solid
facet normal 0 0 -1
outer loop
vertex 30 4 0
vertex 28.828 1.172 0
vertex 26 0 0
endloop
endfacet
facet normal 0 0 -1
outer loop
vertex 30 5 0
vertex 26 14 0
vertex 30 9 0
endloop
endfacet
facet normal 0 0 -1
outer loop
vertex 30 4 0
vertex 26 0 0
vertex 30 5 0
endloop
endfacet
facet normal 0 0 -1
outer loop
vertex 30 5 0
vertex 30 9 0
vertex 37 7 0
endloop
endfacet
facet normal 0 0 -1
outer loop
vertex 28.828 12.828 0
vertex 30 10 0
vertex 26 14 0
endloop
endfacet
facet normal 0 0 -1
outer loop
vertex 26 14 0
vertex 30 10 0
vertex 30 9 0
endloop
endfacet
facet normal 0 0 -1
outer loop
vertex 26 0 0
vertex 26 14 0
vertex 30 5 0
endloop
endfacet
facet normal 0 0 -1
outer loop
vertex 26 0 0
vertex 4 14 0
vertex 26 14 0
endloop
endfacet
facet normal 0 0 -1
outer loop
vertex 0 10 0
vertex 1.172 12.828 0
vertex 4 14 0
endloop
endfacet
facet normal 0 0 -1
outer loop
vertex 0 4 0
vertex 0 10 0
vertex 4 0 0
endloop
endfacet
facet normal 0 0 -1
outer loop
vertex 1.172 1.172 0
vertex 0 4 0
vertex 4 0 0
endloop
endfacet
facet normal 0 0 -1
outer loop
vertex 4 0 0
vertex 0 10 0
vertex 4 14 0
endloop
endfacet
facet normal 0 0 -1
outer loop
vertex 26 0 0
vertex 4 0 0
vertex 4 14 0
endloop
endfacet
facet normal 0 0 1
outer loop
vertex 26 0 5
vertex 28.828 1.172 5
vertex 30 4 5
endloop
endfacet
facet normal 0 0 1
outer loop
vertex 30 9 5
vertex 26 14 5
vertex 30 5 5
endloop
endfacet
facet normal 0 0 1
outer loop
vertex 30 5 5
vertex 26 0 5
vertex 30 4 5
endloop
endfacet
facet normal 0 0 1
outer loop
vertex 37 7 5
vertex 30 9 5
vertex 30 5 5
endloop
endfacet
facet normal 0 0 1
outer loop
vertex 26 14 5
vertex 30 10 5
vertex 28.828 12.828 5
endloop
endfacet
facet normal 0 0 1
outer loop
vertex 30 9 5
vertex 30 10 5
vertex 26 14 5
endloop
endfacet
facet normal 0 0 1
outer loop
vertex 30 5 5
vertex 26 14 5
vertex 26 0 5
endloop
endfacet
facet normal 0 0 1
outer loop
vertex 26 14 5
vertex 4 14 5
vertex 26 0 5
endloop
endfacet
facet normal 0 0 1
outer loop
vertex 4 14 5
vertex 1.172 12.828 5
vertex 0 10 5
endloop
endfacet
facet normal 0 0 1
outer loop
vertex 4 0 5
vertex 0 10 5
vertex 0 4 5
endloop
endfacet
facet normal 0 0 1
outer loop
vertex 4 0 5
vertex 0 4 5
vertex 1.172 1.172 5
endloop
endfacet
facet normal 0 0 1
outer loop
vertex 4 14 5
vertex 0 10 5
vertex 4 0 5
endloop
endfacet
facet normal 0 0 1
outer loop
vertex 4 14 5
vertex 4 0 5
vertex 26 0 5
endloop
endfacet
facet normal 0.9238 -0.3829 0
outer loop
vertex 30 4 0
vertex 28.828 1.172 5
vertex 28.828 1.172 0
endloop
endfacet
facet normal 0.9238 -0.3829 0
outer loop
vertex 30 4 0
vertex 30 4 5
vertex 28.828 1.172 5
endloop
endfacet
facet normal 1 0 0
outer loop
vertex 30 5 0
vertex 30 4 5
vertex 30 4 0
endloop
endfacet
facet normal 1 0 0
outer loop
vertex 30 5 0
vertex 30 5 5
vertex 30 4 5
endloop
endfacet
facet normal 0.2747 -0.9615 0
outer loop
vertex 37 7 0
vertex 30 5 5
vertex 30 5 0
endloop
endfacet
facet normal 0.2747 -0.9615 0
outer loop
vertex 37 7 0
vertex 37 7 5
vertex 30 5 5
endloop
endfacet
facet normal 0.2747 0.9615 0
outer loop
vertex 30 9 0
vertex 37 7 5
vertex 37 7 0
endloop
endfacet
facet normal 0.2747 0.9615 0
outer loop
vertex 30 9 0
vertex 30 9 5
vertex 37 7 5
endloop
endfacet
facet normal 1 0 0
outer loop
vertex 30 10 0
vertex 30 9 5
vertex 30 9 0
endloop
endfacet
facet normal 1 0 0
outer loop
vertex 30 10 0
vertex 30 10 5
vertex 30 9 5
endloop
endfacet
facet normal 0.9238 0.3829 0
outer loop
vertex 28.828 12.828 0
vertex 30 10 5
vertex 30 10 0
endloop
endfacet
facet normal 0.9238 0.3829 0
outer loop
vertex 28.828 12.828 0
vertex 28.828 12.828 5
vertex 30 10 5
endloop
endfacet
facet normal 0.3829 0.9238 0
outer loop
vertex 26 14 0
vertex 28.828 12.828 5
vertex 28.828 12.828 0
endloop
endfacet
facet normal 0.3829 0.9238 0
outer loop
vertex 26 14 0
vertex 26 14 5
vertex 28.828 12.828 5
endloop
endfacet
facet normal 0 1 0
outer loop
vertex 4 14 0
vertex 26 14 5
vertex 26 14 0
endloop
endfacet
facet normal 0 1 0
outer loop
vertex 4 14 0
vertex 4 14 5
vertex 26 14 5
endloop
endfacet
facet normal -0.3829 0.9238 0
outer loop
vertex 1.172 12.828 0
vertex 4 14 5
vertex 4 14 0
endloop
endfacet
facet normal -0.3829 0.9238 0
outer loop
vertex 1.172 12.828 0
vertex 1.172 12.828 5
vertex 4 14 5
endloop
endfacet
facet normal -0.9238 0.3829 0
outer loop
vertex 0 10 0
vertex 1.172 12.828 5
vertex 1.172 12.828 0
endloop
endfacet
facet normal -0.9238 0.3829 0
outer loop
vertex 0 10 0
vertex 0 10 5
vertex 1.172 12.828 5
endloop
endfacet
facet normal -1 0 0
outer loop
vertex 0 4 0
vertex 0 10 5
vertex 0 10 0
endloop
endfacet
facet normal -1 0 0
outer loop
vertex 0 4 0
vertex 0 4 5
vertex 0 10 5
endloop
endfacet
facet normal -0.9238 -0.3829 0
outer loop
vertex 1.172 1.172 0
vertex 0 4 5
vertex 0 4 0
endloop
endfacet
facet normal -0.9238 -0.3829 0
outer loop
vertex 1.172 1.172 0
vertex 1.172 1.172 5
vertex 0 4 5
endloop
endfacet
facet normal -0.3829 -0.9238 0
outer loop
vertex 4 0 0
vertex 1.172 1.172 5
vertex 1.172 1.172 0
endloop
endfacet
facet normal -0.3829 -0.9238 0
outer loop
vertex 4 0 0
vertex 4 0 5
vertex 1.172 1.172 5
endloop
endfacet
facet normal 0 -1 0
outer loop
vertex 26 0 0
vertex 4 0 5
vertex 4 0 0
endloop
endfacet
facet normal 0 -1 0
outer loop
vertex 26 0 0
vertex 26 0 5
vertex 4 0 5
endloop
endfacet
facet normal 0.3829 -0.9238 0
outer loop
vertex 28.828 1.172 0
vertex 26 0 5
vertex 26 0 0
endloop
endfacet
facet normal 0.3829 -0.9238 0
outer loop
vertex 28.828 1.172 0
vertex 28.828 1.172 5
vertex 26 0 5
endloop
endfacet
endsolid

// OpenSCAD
$fn = 32;

// ----------------------------------------------------------------------
// Ratchet pawl: 30 x 14 mm body, beak 7 mm с правого торца
// ----------------------------------------------------------------------

// --- parameters (mm) ---
profile_height = 5;       // extrusion height
profile_points = 15;      // points of the closed outline

profile = [[0, 4], [1.172, 1.172], [4, 0], [26, 0], [28.828, 1.172], [30, 4], [30, 5], [37, 7], [30, 9], [30, 10], [28.828, 12.828], [26, 14], [4, 14], [1.172, 12.828], [0, 10]];  // single closed polygon, 15 points, counter clockwise

// --- the one profile operation ---
linear_extrude(height = profile_height) polygon(points = profile);
